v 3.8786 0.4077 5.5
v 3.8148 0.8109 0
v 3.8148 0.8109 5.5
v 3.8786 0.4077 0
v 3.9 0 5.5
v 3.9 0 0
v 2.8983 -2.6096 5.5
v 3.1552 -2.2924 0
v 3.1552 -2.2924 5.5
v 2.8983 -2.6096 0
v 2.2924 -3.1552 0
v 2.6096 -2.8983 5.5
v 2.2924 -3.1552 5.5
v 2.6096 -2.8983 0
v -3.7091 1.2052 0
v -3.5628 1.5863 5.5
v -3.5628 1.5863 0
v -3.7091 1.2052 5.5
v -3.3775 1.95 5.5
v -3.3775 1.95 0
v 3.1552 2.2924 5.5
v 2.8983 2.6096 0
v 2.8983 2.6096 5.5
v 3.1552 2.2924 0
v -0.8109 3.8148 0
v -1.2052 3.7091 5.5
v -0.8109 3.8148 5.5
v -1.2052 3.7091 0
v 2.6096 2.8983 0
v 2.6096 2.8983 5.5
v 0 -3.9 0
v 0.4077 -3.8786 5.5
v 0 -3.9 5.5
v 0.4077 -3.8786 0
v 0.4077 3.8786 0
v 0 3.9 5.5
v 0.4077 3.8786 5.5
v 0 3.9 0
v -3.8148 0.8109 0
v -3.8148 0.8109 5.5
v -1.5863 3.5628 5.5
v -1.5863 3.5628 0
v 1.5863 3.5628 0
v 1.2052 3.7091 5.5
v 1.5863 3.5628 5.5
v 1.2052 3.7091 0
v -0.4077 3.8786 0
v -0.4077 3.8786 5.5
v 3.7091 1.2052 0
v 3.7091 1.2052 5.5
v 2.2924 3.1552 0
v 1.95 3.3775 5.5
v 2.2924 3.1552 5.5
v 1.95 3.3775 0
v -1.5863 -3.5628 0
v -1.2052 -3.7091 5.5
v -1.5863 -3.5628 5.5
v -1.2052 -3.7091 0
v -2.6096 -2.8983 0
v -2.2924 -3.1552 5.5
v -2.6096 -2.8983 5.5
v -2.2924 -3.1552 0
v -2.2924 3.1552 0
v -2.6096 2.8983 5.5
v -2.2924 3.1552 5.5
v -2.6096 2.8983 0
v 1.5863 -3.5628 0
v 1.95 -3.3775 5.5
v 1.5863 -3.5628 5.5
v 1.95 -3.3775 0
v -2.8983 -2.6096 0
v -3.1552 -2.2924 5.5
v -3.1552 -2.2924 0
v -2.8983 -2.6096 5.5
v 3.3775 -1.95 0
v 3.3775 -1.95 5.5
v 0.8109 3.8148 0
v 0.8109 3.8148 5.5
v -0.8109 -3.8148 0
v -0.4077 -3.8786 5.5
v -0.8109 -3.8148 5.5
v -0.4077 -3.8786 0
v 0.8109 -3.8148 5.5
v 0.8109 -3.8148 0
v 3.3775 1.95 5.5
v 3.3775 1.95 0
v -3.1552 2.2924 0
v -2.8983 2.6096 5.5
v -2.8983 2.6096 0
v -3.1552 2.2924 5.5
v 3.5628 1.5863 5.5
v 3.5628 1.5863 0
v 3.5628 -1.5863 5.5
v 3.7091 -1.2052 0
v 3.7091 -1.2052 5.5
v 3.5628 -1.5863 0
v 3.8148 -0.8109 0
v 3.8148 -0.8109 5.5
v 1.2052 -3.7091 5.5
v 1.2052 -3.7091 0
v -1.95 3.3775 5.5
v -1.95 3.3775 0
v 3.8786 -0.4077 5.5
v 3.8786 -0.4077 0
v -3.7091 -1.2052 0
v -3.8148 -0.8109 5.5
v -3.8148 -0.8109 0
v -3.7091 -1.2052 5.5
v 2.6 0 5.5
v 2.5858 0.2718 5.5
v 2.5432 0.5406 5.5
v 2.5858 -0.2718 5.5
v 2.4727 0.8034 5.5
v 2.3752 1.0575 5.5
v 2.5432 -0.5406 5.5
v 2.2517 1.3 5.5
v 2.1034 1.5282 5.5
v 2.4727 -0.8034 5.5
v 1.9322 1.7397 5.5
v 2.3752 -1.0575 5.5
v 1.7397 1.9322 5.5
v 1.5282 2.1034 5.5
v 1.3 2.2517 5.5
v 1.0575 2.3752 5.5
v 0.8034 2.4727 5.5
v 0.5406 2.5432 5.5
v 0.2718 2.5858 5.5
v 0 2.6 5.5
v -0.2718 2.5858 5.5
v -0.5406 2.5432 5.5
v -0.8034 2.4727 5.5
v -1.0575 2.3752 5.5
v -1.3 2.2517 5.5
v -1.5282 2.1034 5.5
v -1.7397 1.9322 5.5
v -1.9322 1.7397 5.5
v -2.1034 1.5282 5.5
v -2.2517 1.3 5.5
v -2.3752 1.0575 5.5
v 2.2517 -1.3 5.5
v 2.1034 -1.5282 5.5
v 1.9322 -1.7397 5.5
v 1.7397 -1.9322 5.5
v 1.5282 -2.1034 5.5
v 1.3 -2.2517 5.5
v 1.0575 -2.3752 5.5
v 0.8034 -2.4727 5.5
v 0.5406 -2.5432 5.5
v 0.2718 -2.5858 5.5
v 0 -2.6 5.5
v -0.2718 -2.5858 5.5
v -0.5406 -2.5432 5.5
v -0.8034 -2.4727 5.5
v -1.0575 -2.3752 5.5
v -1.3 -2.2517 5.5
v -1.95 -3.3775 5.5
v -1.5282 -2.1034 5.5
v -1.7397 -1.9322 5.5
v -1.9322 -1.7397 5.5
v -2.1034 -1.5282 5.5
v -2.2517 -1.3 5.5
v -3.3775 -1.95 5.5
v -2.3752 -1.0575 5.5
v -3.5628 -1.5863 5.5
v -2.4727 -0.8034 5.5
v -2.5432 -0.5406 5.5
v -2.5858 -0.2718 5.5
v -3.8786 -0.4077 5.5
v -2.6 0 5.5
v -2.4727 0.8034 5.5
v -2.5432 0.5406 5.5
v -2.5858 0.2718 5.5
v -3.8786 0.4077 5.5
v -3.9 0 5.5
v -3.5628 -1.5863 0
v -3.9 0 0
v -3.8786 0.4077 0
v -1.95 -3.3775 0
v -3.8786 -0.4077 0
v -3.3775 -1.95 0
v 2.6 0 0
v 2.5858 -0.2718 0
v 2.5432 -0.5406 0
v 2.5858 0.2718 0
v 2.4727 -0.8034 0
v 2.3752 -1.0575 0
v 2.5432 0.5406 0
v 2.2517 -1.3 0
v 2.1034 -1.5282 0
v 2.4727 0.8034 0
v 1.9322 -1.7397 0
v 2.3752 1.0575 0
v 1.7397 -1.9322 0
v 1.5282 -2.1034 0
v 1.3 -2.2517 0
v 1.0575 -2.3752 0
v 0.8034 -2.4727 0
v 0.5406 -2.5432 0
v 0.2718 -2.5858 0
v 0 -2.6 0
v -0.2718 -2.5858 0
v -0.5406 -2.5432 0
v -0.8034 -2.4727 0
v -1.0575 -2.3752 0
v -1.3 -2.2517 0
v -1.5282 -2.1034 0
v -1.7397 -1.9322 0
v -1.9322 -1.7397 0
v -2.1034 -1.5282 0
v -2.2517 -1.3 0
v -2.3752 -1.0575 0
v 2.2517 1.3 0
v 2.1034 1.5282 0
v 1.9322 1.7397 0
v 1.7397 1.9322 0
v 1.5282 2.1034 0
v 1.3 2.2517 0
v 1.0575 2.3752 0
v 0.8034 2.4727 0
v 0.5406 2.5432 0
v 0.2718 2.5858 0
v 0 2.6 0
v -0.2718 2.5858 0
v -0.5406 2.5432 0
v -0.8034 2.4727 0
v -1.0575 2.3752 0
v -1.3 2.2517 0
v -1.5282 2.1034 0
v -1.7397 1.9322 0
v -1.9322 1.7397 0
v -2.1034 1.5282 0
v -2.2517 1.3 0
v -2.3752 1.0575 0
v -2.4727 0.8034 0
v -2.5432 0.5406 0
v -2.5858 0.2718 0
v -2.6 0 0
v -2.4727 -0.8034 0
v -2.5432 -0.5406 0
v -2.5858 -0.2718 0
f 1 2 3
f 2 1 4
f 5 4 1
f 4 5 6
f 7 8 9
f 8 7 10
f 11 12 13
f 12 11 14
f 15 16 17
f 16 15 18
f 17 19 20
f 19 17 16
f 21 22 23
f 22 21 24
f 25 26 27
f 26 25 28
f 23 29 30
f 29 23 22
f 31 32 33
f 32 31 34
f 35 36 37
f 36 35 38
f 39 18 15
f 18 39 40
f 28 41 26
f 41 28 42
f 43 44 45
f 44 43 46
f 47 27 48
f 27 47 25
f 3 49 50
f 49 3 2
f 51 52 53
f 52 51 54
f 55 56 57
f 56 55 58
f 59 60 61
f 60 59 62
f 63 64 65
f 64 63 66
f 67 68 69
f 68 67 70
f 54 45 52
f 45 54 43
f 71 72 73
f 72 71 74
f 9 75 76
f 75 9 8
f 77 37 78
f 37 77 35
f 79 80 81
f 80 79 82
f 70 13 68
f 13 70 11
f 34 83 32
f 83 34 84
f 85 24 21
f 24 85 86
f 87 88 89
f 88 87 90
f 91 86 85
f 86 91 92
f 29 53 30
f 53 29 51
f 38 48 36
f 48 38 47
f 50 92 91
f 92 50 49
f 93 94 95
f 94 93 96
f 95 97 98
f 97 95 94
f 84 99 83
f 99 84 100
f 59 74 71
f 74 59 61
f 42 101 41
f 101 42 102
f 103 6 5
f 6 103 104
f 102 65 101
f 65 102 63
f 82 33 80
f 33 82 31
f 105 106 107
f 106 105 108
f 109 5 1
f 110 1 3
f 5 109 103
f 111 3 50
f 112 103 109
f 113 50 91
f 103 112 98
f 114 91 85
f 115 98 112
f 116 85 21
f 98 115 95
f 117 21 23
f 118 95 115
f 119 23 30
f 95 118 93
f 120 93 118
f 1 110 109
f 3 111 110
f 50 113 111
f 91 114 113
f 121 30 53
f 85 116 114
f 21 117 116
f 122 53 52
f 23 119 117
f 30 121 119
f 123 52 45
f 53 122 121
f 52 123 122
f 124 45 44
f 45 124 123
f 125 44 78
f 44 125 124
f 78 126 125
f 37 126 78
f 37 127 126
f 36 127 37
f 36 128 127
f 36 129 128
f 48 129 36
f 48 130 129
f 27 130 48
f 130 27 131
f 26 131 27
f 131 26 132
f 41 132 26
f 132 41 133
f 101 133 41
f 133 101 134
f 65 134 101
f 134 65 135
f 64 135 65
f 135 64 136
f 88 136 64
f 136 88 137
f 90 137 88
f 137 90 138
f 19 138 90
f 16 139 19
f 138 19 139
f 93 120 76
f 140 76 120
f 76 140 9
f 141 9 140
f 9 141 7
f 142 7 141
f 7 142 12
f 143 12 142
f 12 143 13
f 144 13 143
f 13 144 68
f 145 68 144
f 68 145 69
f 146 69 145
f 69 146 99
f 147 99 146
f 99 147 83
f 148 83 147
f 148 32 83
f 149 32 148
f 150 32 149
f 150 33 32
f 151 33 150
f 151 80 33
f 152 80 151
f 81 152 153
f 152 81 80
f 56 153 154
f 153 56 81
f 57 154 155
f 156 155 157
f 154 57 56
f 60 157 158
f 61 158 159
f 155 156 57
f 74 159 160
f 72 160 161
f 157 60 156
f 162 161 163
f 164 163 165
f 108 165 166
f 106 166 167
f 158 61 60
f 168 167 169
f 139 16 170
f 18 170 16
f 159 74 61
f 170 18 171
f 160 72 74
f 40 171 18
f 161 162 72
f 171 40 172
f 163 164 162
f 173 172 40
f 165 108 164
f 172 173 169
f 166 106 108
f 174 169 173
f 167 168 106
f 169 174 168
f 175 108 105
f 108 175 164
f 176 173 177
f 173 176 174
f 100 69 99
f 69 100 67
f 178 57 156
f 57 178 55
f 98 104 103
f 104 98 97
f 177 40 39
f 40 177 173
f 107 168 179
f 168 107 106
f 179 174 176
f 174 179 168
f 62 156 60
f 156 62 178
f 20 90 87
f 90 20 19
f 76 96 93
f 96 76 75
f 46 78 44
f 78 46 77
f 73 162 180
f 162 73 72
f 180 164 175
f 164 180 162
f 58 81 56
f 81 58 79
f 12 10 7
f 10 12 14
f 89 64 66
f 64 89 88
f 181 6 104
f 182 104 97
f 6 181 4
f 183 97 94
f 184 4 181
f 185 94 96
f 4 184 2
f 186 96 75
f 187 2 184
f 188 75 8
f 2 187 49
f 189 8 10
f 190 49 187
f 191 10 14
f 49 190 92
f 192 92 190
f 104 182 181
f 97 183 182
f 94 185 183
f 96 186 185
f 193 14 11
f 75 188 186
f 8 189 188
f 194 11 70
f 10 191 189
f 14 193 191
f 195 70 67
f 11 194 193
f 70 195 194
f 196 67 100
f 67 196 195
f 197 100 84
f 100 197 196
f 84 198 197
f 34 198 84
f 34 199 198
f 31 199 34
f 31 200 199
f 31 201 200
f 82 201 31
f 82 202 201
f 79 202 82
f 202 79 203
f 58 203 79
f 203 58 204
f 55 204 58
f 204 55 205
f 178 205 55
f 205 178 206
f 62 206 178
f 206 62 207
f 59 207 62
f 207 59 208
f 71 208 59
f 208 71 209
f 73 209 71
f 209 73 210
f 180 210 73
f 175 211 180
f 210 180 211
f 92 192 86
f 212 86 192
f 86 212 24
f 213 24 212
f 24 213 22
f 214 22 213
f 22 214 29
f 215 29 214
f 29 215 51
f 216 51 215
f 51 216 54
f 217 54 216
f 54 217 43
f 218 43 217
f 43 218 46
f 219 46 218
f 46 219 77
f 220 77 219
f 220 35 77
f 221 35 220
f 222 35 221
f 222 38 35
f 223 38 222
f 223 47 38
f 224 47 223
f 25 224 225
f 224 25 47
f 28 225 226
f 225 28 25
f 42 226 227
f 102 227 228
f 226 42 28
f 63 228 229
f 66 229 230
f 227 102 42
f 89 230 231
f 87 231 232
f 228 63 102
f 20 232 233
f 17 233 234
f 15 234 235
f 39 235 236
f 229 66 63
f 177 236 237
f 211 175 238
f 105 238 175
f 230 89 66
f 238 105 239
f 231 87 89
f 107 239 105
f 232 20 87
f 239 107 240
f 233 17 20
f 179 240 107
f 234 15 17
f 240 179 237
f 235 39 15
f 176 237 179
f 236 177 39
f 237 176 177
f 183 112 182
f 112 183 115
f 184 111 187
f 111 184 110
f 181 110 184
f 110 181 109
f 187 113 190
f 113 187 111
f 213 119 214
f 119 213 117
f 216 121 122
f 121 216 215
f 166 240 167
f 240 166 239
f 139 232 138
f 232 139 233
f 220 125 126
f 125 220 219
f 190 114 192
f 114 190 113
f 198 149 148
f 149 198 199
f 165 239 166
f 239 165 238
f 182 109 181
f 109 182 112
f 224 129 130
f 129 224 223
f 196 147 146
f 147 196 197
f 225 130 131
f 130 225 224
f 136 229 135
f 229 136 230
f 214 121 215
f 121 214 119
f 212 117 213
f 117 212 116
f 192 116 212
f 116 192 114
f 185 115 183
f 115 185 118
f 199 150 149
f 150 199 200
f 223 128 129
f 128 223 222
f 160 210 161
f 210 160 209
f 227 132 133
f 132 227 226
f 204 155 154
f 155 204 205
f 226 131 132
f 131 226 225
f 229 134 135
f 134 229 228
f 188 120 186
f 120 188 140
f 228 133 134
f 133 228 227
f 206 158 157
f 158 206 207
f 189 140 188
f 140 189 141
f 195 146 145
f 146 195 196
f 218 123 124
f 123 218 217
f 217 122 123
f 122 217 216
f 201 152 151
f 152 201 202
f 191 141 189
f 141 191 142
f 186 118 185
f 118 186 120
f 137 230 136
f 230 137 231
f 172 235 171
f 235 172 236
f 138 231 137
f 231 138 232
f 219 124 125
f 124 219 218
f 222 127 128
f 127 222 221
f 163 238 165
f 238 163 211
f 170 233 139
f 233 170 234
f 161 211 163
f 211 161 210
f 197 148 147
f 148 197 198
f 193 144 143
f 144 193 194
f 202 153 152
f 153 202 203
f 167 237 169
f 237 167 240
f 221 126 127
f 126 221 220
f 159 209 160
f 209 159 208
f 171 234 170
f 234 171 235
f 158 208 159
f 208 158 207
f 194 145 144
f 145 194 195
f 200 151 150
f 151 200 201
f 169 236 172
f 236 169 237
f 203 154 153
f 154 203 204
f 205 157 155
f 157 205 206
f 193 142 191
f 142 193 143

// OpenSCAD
$fn=60;
inner=5.2/2;
outer=7.8/2;
depth=5.5;

difference() {
cylinder(r=outer, h=depth);
cylinder(r=inner, h=depth+1);
}
